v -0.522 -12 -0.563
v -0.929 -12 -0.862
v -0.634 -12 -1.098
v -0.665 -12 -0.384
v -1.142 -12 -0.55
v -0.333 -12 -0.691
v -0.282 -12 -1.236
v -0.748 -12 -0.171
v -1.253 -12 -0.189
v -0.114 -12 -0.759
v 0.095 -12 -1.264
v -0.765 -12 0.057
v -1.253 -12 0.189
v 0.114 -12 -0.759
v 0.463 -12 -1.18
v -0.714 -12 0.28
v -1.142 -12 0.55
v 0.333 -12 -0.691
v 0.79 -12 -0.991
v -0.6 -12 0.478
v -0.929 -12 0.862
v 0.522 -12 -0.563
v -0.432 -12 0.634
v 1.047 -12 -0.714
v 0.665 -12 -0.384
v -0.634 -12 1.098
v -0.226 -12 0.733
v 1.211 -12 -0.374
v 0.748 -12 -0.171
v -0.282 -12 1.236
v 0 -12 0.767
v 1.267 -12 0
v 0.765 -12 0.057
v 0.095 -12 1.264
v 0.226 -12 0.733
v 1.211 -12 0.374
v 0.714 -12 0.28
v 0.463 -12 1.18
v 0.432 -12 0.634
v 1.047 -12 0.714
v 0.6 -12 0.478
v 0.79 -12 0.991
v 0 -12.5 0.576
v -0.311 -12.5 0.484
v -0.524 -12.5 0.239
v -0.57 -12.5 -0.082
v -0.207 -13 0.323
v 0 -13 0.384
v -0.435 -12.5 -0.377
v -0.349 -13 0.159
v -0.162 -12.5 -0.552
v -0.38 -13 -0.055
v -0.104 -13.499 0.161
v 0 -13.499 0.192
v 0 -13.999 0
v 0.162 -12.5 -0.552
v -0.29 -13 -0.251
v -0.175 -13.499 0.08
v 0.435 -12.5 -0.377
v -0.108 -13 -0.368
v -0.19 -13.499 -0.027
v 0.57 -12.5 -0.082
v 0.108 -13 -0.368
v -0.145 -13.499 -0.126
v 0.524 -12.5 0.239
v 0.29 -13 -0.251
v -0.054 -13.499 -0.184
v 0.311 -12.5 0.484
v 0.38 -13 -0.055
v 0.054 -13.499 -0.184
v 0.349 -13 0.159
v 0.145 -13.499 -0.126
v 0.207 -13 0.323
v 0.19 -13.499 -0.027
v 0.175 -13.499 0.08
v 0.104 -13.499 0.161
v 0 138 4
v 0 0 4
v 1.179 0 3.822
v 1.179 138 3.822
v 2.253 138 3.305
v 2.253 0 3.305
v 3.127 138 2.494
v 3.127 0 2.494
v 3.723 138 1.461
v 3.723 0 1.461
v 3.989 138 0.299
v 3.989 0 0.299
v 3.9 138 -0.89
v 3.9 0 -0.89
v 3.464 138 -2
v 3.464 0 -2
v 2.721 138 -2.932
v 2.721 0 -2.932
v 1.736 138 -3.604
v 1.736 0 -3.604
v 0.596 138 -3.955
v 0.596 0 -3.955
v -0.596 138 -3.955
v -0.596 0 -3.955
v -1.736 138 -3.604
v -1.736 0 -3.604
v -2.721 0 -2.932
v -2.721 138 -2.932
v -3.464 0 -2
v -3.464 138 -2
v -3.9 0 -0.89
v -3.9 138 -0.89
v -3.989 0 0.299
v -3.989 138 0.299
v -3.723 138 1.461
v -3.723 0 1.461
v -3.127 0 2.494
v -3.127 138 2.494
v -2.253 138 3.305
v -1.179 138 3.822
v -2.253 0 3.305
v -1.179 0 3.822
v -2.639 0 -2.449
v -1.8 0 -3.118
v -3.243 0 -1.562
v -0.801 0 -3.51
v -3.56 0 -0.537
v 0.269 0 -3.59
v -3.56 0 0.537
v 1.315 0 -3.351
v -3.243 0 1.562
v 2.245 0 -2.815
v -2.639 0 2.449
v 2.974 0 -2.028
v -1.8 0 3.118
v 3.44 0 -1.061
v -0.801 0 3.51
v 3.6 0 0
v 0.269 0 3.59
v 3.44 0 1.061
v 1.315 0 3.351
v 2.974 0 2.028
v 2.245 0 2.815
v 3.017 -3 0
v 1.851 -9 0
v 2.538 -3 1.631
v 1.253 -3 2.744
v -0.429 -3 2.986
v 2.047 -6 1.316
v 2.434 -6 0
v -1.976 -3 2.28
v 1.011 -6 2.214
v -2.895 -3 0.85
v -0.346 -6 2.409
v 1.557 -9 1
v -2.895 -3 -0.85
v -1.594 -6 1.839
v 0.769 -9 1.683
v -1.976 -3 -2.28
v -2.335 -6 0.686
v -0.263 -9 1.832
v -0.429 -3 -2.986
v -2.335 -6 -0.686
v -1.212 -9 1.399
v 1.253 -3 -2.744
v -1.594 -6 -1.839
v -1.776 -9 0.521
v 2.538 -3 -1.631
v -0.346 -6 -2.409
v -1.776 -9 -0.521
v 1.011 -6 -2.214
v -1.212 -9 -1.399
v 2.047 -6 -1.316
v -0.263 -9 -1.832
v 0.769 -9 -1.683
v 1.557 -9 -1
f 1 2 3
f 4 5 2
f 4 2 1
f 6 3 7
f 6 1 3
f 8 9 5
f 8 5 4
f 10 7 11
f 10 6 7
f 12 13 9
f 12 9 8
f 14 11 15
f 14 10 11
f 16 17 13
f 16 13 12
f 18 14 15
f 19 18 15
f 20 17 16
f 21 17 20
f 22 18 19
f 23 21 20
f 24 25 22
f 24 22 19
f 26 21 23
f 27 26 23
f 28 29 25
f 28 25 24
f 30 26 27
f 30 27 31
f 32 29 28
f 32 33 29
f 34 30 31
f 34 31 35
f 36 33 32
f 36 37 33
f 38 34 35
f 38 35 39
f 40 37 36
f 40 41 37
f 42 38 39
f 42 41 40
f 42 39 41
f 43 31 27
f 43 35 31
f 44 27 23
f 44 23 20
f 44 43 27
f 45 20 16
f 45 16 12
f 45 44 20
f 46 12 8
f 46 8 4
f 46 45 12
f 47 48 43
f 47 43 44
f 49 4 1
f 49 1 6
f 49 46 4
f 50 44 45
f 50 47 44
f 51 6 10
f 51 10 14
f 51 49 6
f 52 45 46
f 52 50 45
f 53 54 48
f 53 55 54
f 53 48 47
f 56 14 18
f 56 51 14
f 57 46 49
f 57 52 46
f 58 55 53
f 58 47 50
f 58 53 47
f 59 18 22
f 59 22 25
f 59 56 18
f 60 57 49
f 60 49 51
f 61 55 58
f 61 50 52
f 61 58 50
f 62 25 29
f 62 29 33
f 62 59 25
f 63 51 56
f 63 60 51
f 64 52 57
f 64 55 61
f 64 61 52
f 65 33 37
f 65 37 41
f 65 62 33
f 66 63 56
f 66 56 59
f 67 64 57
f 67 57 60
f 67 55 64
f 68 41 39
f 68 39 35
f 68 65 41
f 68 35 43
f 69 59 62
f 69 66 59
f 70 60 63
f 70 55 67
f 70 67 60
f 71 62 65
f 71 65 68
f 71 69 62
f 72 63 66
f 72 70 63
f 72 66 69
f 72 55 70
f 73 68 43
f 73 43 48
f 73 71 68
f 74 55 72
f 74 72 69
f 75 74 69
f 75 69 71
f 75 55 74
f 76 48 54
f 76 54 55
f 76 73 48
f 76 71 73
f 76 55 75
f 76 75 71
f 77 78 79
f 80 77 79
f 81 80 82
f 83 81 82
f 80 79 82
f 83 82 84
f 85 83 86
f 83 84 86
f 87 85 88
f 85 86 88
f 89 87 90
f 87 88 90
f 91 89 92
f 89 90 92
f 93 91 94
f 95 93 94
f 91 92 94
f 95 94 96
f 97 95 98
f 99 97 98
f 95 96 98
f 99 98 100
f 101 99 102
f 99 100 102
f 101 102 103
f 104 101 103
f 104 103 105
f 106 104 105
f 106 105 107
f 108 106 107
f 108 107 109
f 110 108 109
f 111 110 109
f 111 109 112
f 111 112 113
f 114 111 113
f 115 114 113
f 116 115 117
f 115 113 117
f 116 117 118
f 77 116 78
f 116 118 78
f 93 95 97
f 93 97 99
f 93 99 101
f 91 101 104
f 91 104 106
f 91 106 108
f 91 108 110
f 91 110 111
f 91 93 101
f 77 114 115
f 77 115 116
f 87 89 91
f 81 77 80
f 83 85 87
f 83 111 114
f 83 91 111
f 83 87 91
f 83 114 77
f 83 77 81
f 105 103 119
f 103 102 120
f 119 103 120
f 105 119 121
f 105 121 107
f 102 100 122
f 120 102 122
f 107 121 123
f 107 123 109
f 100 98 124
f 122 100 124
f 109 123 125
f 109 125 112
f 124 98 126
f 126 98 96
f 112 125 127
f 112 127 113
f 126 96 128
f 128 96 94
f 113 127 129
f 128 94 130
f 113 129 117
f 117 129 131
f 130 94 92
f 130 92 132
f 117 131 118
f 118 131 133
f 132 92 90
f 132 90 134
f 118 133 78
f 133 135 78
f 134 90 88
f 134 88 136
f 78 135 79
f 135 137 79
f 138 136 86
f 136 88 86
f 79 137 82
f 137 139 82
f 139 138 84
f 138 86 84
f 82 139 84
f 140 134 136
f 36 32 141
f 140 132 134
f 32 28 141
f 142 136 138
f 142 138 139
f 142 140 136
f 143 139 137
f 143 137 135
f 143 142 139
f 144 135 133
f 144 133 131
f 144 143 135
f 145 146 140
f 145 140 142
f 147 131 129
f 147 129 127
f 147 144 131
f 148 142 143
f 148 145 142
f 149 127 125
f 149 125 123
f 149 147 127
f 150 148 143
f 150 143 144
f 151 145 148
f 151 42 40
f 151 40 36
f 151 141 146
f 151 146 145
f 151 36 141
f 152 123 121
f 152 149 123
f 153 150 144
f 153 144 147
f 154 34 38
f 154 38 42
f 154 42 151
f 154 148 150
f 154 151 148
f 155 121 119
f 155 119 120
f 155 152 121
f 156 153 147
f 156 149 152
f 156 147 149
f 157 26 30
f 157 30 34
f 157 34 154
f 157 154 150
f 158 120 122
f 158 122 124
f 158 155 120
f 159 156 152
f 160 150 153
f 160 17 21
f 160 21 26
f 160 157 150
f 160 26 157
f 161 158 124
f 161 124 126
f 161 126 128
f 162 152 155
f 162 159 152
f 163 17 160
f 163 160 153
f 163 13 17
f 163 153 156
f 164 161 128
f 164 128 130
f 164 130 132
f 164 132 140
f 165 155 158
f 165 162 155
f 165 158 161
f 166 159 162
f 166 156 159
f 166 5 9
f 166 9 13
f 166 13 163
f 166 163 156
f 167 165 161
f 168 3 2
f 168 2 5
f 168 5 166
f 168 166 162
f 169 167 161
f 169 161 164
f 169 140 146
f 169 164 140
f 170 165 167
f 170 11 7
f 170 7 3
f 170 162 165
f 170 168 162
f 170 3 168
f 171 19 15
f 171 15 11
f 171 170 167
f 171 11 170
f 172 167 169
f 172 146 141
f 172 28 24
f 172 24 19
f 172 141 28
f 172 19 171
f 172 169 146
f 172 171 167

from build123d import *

# Parameters (mm, degrees)
SKETCH1_R           = 4
BOSS_EXTRUDE1_DEPTH = 138
SKETCH2_R           = 3.6
BOSS_EXTRUDE2_DEPTH = 12
BOSS_EXTRUDE2_TAPER = 11


with BuildPart() as part:
    # Sketch1 → Boss-Extrude1 (new body)
    with BuildSketch(Plane(origin=(0, 0, 0), x_dir=(1, 0, 0), z_dir=(0, 1, 0))):
        with Locations(Location((0, 0, 0), (0, 0, 270))):
            Circle(SKETCH1_R)
    extrude(amount=BOSS_EXTRUDE1_DEPTH)

    # Sketch2 → Boss-Extrude2 (add)
    with BuildSketch(Plane.XZ):
        Circle(SKETCH2_R)
    extrude(amount=BOSS_EXTRUDE2_DEPTH, taper=BOSS_EXTRUDE2_TAPER)

    # Boss-Extrude3 cone 1 section (through the dimple's axis) → Boss-Extrude3 (revolve)
    with BuildSketch(Plane(origin=(0, -12, 0), x_dir=(0, 0, 1), z_dir=(1, 0, 0))):
        Polygon((0, 0), (0.76743629, 0), (0, 1.999239888), align=None)
    revolve(axis=Axis((0, -12, 0), (0, -1, 0)))


solid = part.part
